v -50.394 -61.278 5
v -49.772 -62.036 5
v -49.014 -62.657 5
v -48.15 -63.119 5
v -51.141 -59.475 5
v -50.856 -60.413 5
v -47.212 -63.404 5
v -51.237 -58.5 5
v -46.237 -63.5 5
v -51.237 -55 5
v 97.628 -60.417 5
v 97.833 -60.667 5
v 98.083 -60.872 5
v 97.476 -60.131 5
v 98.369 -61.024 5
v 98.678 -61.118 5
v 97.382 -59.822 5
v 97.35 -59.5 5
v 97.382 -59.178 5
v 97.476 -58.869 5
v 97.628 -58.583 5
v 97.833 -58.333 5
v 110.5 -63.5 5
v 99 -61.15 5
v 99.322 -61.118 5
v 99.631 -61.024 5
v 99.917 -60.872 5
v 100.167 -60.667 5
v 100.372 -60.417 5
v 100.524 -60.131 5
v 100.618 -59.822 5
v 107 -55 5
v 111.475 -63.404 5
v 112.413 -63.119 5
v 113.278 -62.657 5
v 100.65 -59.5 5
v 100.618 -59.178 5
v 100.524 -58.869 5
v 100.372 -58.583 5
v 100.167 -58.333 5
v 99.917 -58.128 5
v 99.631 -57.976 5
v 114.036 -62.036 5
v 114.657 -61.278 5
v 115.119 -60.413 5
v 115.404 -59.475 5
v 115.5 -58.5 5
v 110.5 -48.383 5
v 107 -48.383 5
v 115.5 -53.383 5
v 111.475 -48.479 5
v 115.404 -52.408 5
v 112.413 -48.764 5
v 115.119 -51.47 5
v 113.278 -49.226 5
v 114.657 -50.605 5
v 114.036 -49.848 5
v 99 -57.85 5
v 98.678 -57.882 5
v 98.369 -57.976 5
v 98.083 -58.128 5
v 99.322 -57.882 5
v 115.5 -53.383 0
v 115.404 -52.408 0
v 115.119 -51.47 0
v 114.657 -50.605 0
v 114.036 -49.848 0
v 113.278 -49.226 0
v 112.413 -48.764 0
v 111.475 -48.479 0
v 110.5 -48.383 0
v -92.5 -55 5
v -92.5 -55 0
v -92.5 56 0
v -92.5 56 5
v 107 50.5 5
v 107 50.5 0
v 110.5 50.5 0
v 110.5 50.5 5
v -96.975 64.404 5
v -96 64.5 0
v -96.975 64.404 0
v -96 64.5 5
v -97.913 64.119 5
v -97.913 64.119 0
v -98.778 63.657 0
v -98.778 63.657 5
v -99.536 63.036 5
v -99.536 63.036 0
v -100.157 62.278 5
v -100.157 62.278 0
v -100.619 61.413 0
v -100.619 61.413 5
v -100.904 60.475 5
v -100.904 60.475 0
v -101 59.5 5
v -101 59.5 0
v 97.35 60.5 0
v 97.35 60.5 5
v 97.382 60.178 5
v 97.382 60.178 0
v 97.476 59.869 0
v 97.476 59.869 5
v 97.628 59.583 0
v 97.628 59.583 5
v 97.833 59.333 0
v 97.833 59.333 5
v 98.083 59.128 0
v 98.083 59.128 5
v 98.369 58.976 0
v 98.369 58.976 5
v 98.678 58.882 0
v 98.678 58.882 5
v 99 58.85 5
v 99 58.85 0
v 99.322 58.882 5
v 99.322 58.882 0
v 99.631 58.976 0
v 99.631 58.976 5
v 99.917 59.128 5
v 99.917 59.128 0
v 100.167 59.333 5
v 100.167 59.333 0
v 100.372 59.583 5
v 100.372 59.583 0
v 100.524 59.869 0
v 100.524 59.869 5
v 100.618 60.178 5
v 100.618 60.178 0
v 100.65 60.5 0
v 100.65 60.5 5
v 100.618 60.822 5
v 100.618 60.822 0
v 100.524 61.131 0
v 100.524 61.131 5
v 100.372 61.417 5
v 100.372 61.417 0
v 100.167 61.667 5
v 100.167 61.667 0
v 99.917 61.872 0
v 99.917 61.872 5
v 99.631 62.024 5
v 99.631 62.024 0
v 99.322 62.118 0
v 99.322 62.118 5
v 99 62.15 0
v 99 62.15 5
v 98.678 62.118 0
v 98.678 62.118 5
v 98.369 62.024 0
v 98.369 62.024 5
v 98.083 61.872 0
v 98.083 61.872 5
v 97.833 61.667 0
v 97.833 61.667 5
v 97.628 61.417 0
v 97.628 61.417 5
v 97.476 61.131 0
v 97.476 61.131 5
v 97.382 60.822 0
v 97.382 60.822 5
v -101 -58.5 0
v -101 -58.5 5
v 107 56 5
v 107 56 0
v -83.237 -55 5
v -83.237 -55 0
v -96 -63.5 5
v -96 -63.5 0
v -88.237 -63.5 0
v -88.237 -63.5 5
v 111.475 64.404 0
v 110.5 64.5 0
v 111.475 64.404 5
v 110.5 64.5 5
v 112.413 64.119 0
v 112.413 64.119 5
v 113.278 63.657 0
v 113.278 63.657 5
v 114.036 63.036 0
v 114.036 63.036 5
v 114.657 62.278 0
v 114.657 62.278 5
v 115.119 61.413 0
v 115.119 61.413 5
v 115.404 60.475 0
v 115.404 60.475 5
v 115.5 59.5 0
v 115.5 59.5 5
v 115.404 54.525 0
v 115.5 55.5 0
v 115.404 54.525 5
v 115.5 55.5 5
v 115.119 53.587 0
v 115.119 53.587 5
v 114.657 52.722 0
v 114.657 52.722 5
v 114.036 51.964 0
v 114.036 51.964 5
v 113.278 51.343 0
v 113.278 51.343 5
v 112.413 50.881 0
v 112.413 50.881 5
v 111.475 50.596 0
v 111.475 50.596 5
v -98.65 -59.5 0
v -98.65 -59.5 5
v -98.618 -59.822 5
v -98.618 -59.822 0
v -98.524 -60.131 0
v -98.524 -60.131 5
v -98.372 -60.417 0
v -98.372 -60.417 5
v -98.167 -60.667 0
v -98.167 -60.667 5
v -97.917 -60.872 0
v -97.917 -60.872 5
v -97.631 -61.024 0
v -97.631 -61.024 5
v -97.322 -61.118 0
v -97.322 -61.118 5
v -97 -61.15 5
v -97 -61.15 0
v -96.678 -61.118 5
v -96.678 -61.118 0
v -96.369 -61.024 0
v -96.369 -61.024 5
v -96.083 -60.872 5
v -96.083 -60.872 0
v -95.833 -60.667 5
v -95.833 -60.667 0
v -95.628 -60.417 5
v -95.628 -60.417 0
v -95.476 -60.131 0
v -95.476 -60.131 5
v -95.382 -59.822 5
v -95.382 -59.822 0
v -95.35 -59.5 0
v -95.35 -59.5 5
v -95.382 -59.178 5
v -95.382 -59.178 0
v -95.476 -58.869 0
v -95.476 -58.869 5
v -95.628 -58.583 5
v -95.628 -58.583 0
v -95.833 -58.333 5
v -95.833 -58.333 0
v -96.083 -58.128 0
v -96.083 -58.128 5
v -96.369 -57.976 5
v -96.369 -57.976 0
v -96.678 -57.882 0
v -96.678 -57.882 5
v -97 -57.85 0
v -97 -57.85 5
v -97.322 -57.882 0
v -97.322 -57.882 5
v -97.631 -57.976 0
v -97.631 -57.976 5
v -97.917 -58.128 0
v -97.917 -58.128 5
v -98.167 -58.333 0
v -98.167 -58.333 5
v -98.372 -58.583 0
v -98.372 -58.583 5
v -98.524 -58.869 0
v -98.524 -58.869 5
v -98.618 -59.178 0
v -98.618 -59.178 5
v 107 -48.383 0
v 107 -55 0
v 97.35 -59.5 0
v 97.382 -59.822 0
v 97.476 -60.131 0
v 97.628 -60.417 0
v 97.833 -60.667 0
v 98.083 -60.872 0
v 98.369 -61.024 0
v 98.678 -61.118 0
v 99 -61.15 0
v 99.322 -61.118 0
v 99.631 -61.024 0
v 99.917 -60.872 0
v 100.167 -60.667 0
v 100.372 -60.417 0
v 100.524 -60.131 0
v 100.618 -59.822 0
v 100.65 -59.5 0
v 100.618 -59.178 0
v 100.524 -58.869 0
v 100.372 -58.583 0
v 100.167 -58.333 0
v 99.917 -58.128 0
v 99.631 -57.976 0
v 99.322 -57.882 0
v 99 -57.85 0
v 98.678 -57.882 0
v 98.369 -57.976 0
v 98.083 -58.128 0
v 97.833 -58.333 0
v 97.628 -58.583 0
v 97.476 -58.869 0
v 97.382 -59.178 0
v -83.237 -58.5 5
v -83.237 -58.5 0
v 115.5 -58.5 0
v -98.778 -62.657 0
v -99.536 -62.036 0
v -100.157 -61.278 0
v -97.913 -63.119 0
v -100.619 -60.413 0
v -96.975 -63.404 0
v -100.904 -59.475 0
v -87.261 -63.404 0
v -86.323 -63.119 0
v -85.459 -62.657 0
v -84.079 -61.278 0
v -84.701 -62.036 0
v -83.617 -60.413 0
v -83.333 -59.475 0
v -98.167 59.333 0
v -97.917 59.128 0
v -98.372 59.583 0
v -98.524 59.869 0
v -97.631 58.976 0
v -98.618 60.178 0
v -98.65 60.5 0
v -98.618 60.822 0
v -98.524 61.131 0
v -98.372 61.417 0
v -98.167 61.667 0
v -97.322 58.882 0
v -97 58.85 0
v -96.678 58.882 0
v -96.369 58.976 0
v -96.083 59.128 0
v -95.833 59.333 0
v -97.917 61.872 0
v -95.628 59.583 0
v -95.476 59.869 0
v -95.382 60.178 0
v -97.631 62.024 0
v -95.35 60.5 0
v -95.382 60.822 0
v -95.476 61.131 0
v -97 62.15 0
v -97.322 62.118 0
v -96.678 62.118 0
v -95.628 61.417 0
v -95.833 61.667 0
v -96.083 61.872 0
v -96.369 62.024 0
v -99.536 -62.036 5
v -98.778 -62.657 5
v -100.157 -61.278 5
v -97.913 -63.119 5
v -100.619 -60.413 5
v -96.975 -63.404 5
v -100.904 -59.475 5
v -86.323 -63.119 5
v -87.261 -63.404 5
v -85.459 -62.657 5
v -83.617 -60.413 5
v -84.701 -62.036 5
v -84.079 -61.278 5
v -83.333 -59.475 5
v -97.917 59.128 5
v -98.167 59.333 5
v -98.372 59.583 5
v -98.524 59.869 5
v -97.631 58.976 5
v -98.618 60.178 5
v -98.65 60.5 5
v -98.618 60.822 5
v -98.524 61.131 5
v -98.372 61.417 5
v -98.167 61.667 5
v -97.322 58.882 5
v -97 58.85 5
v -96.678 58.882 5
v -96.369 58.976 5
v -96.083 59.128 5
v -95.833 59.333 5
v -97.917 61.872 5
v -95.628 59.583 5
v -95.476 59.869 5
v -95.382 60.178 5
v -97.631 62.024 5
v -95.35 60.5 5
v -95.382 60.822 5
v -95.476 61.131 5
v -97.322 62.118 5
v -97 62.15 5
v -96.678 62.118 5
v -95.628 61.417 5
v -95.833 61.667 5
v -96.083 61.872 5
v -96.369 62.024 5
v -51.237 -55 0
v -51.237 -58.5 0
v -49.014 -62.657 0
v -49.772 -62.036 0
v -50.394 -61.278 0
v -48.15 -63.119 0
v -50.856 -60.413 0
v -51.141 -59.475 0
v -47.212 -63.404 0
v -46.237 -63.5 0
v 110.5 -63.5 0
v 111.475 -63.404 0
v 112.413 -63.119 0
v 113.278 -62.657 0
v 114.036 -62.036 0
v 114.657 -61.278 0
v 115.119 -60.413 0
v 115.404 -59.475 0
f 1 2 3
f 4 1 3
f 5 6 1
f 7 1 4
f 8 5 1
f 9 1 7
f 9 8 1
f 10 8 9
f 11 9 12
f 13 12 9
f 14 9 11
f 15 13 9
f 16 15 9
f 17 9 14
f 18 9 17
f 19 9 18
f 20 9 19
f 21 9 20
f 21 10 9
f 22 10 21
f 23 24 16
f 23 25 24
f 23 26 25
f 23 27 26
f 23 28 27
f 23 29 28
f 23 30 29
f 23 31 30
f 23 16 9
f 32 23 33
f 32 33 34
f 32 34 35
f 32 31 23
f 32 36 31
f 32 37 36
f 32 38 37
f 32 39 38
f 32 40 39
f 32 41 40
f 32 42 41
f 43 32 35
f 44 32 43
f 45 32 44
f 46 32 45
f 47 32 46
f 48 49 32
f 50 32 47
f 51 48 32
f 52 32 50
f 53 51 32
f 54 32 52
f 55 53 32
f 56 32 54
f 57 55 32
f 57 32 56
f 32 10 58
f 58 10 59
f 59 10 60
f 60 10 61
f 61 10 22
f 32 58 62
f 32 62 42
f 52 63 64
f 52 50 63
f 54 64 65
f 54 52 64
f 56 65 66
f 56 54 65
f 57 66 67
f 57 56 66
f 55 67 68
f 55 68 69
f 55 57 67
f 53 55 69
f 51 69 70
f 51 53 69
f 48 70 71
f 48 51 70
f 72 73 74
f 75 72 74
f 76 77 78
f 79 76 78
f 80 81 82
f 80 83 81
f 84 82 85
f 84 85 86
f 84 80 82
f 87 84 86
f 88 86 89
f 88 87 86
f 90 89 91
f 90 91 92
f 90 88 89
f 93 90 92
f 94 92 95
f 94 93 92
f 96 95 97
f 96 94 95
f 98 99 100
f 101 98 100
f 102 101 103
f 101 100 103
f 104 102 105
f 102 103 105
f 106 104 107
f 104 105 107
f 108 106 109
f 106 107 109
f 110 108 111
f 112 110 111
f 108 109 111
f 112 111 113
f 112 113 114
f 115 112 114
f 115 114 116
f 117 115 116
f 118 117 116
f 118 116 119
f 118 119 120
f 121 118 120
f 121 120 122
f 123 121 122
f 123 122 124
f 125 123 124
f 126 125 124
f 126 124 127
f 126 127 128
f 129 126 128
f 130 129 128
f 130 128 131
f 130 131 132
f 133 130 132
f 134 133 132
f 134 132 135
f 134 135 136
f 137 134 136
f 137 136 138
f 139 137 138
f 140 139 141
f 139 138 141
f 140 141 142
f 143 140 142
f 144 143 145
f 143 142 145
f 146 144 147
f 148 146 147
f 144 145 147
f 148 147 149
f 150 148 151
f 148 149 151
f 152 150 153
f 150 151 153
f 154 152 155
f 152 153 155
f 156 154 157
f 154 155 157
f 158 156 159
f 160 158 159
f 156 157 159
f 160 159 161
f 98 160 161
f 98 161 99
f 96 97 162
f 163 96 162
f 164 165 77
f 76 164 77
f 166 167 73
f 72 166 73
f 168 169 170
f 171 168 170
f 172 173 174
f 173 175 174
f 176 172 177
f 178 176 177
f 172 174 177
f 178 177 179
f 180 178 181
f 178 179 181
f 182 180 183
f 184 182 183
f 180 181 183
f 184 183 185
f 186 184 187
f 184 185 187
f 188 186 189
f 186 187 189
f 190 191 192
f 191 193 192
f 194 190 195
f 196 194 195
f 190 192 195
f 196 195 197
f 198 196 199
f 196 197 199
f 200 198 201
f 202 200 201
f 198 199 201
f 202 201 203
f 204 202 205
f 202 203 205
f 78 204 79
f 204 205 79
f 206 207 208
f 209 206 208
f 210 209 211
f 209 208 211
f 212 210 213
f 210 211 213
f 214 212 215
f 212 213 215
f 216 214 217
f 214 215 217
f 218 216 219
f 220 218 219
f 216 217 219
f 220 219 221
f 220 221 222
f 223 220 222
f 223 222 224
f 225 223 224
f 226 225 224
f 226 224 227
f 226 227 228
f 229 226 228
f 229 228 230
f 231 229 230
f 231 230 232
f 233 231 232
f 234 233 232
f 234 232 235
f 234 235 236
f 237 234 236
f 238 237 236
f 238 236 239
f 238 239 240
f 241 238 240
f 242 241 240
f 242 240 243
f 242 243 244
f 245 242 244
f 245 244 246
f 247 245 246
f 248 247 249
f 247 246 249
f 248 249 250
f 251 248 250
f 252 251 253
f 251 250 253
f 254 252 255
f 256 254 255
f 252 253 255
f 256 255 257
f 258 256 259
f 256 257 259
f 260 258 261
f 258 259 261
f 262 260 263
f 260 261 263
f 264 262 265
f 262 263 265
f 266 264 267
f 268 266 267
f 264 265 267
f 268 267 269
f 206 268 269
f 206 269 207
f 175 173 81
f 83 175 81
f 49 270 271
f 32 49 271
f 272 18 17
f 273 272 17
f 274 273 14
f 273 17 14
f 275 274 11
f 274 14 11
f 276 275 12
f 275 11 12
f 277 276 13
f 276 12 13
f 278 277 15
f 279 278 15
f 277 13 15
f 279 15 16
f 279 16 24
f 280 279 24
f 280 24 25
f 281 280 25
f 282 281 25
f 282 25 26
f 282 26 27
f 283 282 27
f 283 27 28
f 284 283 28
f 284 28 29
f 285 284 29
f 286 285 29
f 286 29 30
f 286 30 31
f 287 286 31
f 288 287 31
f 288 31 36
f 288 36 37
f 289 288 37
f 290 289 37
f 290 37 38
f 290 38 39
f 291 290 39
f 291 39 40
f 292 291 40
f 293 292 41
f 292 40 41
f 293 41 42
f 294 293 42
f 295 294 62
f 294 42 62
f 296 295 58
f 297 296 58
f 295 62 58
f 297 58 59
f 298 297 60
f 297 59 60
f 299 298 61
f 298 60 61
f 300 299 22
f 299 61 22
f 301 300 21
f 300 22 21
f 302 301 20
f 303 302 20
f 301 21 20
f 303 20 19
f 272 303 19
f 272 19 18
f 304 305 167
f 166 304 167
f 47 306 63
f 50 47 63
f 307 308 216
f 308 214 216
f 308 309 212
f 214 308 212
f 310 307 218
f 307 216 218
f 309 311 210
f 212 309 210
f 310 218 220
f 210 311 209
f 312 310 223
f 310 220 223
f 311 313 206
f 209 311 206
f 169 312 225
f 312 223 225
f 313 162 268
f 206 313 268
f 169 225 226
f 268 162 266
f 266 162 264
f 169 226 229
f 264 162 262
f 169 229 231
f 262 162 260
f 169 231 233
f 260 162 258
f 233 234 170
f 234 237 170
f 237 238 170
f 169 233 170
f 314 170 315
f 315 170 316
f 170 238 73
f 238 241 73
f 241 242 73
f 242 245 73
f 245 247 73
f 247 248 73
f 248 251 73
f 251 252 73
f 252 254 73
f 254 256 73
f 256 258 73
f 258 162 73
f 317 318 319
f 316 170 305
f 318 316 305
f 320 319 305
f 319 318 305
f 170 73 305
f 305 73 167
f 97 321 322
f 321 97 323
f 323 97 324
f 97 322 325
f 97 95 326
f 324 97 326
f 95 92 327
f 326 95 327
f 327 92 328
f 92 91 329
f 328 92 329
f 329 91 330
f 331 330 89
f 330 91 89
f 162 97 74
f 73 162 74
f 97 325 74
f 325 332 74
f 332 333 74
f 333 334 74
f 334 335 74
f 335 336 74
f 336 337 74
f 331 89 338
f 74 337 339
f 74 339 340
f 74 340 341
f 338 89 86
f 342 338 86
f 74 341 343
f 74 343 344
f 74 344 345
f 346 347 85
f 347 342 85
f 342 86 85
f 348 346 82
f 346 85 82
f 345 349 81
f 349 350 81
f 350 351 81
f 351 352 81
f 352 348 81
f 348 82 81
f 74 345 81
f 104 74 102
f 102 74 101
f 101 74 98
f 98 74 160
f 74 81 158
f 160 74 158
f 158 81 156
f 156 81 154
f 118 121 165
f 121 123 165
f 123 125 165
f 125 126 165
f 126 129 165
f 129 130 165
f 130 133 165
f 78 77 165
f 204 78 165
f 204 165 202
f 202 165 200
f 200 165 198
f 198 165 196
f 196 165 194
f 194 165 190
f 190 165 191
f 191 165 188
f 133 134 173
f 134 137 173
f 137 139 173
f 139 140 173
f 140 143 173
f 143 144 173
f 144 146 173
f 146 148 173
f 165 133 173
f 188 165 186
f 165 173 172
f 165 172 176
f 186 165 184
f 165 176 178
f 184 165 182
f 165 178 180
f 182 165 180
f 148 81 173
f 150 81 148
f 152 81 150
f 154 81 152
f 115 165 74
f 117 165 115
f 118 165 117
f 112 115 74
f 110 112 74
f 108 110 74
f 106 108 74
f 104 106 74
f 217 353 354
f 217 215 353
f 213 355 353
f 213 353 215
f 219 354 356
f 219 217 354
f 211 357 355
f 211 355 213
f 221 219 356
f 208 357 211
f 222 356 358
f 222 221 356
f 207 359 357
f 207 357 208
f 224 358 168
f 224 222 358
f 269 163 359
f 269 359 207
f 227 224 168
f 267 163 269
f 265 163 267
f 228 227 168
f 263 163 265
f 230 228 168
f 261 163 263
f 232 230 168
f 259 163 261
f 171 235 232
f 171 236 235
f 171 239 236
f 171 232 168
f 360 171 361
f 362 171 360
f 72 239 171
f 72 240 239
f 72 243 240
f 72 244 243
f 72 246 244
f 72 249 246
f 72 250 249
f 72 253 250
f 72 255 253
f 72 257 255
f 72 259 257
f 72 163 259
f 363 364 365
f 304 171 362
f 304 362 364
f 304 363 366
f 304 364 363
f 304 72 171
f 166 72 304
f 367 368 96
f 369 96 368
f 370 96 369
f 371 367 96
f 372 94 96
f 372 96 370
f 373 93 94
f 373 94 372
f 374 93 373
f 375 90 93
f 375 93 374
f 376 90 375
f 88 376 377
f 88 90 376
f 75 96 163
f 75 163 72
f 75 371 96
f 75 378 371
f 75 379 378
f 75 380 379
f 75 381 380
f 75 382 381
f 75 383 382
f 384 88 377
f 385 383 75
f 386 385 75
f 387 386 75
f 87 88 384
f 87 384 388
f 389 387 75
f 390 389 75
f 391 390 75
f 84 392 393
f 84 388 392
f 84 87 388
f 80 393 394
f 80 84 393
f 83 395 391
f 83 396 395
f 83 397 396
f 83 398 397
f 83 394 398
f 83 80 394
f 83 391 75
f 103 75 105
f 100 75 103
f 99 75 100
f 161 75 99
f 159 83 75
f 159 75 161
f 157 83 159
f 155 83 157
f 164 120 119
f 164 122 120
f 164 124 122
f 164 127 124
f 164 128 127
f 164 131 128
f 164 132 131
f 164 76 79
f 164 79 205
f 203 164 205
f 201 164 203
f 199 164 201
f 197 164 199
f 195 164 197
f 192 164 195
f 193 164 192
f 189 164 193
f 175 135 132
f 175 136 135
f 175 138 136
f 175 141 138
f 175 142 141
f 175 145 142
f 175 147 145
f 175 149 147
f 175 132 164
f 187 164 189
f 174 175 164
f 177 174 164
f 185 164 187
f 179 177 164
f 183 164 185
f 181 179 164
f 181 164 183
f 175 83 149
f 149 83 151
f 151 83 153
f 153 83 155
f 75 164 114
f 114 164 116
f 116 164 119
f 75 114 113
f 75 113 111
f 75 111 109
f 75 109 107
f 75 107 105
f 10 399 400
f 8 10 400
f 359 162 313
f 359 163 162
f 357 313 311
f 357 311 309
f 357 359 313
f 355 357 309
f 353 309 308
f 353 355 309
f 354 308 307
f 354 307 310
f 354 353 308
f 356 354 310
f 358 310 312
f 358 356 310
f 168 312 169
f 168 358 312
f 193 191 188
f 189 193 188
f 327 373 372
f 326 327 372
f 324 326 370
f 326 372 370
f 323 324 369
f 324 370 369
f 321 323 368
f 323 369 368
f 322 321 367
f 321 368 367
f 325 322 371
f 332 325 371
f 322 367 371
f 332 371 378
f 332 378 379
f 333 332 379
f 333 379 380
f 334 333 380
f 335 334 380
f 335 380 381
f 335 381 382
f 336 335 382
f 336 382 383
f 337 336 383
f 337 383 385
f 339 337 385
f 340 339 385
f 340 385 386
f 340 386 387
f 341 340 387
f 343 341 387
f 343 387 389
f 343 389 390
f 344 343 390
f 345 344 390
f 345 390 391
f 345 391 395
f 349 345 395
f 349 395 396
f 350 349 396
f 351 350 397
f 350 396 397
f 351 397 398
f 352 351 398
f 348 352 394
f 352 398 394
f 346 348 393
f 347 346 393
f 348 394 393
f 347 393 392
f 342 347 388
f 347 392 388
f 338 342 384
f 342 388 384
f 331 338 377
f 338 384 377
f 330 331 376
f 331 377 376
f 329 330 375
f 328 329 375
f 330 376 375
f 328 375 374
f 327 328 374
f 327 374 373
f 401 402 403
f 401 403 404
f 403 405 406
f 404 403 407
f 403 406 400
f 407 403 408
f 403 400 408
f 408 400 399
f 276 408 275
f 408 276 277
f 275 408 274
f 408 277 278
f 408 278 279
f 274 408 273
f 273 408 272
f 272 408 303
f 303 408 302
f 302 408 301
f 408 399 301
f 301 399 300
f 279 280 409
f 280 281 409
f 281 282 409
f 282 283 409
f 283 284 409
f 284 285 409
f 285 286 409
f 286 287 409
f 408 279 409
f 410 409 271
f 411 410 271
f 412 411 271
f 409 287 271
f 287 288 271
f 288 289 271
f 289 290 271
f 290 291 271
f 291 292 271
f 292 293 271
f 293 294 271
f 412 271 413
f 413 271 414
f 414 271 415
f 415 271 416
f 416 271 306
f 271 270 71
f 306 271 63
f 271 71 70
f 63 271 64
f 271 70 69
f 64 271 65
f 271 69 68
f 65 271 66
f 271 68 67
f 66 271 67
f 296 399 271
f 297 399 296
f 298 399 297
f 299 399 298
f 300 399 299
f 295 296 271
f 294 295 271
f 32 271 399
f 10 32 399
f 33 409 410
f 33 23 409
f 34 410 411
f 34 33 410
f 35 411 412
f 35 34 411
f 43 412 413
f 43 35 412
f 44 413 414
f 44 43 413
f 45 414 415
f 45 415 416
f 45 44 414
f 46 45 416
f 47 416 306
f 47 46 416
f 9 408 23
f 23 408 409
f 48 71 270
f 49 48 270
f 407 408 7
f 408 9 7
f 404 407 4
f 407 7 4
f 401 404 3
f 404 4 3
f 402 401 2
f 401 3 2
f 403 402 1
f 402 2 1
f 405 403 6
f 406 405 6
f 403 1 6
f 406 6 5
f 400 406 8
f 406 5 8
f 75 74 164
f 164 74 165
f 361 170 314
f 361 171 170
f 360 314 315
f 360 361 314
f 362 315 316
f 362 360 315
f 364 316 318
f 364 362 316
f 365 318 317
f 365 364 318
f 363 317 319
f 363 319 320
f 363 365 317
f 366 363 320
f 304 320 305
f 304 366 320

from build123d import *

# Parameters (mm, degrees)
F1_DEPTH = 5
F2_D     = 3.3
F2_2_D   = 3.3
F3_R     = 5
F3_2_R   = 5


# Not quite as in the source:
# - two fillets or chamfers of one size are made in one step


with BuildPart() as f1:
    # F0 (on Top) → F1 (new body)
    with BuildSketch(Plane.XY):
        Polygon((115.4999993443, 64.5), (103, 64.5), (-57.083491236, 64.5), (-83.2366272807, 64.5), (-101, 64.5), (-101, -63.5), (-83.2366272807, -63.5), (-83.2366272807, -55), (-92.5, -55), (-92.5, 56), (-83.0929607174, 56), (-57.083491236, 56), (103, 56), (106.9999993443, 56), (106.9999993443, 50.5), (115.4999993443, 50.5), align=None)
    extrude(amount=F1_DEPTH)

    # F2 (through all)
    with Locations(Plane(origin=(0, 0, 0), x_dir=(1, 0, 0), z_dir=(0, 0, -1))):
        with Locations((-97, -60.5), (99, -60.5), (-97, 59.5), (99, 59.5)):
            Hole(F2_D / 2)

    # F3
    f3_edges = [f1.edges().sort_by_distance(p)[0] for p in [
        (-101, 64.5, 2.5),
        (115.499999, 64.5, 2.5),
        (-101, -63.5, 2.5),
        (-83.236627, -63.5, 2.5),
        (115.499999, 50.5, 2.5),
    ]]
    fillet(f3_edges, radius=F3_R)


with BuildPart() as f1b:
    # F0 (on Top) → F1, piece 2 (new body)
    with BuildSketch(Plane.XY):
        Polygon((-51.2366272807, -63.5), (103, -63.5), (115.4999993443, -63.5), (115.4999993443, -48.3833029866), (106.9999993443, -48.3833029866), (106.9999993443, -55), (103, -55), (-51.2366272807, -55), align=None)
    extrude(amount=F1_DEPTH)

    # F2#2 (through all)
    with Locations(Plane(origin=(0, 0, 0), x_dir=(1, 0, 0), z_dir=(0, 0, -1))):
        with Locations((-97, -60.5), (99, -60.5), (-97, 59.5), (99, 59.5)):
            Hole(F2_2_D / 2)

    # F3#2
    f3_2_edges = [f1b.edges().sort_by_distance(p)[0] for p in [
        (-51.236627, -63.5, 2.5),
        (115.499999, -63.5, 2.5),
        (115.499999, -48.383303, 2.5),
    ]]
    fillet(f3_2_edges, radius=F3_2_R)


solid = Compound([f1.part, f1b.part])
